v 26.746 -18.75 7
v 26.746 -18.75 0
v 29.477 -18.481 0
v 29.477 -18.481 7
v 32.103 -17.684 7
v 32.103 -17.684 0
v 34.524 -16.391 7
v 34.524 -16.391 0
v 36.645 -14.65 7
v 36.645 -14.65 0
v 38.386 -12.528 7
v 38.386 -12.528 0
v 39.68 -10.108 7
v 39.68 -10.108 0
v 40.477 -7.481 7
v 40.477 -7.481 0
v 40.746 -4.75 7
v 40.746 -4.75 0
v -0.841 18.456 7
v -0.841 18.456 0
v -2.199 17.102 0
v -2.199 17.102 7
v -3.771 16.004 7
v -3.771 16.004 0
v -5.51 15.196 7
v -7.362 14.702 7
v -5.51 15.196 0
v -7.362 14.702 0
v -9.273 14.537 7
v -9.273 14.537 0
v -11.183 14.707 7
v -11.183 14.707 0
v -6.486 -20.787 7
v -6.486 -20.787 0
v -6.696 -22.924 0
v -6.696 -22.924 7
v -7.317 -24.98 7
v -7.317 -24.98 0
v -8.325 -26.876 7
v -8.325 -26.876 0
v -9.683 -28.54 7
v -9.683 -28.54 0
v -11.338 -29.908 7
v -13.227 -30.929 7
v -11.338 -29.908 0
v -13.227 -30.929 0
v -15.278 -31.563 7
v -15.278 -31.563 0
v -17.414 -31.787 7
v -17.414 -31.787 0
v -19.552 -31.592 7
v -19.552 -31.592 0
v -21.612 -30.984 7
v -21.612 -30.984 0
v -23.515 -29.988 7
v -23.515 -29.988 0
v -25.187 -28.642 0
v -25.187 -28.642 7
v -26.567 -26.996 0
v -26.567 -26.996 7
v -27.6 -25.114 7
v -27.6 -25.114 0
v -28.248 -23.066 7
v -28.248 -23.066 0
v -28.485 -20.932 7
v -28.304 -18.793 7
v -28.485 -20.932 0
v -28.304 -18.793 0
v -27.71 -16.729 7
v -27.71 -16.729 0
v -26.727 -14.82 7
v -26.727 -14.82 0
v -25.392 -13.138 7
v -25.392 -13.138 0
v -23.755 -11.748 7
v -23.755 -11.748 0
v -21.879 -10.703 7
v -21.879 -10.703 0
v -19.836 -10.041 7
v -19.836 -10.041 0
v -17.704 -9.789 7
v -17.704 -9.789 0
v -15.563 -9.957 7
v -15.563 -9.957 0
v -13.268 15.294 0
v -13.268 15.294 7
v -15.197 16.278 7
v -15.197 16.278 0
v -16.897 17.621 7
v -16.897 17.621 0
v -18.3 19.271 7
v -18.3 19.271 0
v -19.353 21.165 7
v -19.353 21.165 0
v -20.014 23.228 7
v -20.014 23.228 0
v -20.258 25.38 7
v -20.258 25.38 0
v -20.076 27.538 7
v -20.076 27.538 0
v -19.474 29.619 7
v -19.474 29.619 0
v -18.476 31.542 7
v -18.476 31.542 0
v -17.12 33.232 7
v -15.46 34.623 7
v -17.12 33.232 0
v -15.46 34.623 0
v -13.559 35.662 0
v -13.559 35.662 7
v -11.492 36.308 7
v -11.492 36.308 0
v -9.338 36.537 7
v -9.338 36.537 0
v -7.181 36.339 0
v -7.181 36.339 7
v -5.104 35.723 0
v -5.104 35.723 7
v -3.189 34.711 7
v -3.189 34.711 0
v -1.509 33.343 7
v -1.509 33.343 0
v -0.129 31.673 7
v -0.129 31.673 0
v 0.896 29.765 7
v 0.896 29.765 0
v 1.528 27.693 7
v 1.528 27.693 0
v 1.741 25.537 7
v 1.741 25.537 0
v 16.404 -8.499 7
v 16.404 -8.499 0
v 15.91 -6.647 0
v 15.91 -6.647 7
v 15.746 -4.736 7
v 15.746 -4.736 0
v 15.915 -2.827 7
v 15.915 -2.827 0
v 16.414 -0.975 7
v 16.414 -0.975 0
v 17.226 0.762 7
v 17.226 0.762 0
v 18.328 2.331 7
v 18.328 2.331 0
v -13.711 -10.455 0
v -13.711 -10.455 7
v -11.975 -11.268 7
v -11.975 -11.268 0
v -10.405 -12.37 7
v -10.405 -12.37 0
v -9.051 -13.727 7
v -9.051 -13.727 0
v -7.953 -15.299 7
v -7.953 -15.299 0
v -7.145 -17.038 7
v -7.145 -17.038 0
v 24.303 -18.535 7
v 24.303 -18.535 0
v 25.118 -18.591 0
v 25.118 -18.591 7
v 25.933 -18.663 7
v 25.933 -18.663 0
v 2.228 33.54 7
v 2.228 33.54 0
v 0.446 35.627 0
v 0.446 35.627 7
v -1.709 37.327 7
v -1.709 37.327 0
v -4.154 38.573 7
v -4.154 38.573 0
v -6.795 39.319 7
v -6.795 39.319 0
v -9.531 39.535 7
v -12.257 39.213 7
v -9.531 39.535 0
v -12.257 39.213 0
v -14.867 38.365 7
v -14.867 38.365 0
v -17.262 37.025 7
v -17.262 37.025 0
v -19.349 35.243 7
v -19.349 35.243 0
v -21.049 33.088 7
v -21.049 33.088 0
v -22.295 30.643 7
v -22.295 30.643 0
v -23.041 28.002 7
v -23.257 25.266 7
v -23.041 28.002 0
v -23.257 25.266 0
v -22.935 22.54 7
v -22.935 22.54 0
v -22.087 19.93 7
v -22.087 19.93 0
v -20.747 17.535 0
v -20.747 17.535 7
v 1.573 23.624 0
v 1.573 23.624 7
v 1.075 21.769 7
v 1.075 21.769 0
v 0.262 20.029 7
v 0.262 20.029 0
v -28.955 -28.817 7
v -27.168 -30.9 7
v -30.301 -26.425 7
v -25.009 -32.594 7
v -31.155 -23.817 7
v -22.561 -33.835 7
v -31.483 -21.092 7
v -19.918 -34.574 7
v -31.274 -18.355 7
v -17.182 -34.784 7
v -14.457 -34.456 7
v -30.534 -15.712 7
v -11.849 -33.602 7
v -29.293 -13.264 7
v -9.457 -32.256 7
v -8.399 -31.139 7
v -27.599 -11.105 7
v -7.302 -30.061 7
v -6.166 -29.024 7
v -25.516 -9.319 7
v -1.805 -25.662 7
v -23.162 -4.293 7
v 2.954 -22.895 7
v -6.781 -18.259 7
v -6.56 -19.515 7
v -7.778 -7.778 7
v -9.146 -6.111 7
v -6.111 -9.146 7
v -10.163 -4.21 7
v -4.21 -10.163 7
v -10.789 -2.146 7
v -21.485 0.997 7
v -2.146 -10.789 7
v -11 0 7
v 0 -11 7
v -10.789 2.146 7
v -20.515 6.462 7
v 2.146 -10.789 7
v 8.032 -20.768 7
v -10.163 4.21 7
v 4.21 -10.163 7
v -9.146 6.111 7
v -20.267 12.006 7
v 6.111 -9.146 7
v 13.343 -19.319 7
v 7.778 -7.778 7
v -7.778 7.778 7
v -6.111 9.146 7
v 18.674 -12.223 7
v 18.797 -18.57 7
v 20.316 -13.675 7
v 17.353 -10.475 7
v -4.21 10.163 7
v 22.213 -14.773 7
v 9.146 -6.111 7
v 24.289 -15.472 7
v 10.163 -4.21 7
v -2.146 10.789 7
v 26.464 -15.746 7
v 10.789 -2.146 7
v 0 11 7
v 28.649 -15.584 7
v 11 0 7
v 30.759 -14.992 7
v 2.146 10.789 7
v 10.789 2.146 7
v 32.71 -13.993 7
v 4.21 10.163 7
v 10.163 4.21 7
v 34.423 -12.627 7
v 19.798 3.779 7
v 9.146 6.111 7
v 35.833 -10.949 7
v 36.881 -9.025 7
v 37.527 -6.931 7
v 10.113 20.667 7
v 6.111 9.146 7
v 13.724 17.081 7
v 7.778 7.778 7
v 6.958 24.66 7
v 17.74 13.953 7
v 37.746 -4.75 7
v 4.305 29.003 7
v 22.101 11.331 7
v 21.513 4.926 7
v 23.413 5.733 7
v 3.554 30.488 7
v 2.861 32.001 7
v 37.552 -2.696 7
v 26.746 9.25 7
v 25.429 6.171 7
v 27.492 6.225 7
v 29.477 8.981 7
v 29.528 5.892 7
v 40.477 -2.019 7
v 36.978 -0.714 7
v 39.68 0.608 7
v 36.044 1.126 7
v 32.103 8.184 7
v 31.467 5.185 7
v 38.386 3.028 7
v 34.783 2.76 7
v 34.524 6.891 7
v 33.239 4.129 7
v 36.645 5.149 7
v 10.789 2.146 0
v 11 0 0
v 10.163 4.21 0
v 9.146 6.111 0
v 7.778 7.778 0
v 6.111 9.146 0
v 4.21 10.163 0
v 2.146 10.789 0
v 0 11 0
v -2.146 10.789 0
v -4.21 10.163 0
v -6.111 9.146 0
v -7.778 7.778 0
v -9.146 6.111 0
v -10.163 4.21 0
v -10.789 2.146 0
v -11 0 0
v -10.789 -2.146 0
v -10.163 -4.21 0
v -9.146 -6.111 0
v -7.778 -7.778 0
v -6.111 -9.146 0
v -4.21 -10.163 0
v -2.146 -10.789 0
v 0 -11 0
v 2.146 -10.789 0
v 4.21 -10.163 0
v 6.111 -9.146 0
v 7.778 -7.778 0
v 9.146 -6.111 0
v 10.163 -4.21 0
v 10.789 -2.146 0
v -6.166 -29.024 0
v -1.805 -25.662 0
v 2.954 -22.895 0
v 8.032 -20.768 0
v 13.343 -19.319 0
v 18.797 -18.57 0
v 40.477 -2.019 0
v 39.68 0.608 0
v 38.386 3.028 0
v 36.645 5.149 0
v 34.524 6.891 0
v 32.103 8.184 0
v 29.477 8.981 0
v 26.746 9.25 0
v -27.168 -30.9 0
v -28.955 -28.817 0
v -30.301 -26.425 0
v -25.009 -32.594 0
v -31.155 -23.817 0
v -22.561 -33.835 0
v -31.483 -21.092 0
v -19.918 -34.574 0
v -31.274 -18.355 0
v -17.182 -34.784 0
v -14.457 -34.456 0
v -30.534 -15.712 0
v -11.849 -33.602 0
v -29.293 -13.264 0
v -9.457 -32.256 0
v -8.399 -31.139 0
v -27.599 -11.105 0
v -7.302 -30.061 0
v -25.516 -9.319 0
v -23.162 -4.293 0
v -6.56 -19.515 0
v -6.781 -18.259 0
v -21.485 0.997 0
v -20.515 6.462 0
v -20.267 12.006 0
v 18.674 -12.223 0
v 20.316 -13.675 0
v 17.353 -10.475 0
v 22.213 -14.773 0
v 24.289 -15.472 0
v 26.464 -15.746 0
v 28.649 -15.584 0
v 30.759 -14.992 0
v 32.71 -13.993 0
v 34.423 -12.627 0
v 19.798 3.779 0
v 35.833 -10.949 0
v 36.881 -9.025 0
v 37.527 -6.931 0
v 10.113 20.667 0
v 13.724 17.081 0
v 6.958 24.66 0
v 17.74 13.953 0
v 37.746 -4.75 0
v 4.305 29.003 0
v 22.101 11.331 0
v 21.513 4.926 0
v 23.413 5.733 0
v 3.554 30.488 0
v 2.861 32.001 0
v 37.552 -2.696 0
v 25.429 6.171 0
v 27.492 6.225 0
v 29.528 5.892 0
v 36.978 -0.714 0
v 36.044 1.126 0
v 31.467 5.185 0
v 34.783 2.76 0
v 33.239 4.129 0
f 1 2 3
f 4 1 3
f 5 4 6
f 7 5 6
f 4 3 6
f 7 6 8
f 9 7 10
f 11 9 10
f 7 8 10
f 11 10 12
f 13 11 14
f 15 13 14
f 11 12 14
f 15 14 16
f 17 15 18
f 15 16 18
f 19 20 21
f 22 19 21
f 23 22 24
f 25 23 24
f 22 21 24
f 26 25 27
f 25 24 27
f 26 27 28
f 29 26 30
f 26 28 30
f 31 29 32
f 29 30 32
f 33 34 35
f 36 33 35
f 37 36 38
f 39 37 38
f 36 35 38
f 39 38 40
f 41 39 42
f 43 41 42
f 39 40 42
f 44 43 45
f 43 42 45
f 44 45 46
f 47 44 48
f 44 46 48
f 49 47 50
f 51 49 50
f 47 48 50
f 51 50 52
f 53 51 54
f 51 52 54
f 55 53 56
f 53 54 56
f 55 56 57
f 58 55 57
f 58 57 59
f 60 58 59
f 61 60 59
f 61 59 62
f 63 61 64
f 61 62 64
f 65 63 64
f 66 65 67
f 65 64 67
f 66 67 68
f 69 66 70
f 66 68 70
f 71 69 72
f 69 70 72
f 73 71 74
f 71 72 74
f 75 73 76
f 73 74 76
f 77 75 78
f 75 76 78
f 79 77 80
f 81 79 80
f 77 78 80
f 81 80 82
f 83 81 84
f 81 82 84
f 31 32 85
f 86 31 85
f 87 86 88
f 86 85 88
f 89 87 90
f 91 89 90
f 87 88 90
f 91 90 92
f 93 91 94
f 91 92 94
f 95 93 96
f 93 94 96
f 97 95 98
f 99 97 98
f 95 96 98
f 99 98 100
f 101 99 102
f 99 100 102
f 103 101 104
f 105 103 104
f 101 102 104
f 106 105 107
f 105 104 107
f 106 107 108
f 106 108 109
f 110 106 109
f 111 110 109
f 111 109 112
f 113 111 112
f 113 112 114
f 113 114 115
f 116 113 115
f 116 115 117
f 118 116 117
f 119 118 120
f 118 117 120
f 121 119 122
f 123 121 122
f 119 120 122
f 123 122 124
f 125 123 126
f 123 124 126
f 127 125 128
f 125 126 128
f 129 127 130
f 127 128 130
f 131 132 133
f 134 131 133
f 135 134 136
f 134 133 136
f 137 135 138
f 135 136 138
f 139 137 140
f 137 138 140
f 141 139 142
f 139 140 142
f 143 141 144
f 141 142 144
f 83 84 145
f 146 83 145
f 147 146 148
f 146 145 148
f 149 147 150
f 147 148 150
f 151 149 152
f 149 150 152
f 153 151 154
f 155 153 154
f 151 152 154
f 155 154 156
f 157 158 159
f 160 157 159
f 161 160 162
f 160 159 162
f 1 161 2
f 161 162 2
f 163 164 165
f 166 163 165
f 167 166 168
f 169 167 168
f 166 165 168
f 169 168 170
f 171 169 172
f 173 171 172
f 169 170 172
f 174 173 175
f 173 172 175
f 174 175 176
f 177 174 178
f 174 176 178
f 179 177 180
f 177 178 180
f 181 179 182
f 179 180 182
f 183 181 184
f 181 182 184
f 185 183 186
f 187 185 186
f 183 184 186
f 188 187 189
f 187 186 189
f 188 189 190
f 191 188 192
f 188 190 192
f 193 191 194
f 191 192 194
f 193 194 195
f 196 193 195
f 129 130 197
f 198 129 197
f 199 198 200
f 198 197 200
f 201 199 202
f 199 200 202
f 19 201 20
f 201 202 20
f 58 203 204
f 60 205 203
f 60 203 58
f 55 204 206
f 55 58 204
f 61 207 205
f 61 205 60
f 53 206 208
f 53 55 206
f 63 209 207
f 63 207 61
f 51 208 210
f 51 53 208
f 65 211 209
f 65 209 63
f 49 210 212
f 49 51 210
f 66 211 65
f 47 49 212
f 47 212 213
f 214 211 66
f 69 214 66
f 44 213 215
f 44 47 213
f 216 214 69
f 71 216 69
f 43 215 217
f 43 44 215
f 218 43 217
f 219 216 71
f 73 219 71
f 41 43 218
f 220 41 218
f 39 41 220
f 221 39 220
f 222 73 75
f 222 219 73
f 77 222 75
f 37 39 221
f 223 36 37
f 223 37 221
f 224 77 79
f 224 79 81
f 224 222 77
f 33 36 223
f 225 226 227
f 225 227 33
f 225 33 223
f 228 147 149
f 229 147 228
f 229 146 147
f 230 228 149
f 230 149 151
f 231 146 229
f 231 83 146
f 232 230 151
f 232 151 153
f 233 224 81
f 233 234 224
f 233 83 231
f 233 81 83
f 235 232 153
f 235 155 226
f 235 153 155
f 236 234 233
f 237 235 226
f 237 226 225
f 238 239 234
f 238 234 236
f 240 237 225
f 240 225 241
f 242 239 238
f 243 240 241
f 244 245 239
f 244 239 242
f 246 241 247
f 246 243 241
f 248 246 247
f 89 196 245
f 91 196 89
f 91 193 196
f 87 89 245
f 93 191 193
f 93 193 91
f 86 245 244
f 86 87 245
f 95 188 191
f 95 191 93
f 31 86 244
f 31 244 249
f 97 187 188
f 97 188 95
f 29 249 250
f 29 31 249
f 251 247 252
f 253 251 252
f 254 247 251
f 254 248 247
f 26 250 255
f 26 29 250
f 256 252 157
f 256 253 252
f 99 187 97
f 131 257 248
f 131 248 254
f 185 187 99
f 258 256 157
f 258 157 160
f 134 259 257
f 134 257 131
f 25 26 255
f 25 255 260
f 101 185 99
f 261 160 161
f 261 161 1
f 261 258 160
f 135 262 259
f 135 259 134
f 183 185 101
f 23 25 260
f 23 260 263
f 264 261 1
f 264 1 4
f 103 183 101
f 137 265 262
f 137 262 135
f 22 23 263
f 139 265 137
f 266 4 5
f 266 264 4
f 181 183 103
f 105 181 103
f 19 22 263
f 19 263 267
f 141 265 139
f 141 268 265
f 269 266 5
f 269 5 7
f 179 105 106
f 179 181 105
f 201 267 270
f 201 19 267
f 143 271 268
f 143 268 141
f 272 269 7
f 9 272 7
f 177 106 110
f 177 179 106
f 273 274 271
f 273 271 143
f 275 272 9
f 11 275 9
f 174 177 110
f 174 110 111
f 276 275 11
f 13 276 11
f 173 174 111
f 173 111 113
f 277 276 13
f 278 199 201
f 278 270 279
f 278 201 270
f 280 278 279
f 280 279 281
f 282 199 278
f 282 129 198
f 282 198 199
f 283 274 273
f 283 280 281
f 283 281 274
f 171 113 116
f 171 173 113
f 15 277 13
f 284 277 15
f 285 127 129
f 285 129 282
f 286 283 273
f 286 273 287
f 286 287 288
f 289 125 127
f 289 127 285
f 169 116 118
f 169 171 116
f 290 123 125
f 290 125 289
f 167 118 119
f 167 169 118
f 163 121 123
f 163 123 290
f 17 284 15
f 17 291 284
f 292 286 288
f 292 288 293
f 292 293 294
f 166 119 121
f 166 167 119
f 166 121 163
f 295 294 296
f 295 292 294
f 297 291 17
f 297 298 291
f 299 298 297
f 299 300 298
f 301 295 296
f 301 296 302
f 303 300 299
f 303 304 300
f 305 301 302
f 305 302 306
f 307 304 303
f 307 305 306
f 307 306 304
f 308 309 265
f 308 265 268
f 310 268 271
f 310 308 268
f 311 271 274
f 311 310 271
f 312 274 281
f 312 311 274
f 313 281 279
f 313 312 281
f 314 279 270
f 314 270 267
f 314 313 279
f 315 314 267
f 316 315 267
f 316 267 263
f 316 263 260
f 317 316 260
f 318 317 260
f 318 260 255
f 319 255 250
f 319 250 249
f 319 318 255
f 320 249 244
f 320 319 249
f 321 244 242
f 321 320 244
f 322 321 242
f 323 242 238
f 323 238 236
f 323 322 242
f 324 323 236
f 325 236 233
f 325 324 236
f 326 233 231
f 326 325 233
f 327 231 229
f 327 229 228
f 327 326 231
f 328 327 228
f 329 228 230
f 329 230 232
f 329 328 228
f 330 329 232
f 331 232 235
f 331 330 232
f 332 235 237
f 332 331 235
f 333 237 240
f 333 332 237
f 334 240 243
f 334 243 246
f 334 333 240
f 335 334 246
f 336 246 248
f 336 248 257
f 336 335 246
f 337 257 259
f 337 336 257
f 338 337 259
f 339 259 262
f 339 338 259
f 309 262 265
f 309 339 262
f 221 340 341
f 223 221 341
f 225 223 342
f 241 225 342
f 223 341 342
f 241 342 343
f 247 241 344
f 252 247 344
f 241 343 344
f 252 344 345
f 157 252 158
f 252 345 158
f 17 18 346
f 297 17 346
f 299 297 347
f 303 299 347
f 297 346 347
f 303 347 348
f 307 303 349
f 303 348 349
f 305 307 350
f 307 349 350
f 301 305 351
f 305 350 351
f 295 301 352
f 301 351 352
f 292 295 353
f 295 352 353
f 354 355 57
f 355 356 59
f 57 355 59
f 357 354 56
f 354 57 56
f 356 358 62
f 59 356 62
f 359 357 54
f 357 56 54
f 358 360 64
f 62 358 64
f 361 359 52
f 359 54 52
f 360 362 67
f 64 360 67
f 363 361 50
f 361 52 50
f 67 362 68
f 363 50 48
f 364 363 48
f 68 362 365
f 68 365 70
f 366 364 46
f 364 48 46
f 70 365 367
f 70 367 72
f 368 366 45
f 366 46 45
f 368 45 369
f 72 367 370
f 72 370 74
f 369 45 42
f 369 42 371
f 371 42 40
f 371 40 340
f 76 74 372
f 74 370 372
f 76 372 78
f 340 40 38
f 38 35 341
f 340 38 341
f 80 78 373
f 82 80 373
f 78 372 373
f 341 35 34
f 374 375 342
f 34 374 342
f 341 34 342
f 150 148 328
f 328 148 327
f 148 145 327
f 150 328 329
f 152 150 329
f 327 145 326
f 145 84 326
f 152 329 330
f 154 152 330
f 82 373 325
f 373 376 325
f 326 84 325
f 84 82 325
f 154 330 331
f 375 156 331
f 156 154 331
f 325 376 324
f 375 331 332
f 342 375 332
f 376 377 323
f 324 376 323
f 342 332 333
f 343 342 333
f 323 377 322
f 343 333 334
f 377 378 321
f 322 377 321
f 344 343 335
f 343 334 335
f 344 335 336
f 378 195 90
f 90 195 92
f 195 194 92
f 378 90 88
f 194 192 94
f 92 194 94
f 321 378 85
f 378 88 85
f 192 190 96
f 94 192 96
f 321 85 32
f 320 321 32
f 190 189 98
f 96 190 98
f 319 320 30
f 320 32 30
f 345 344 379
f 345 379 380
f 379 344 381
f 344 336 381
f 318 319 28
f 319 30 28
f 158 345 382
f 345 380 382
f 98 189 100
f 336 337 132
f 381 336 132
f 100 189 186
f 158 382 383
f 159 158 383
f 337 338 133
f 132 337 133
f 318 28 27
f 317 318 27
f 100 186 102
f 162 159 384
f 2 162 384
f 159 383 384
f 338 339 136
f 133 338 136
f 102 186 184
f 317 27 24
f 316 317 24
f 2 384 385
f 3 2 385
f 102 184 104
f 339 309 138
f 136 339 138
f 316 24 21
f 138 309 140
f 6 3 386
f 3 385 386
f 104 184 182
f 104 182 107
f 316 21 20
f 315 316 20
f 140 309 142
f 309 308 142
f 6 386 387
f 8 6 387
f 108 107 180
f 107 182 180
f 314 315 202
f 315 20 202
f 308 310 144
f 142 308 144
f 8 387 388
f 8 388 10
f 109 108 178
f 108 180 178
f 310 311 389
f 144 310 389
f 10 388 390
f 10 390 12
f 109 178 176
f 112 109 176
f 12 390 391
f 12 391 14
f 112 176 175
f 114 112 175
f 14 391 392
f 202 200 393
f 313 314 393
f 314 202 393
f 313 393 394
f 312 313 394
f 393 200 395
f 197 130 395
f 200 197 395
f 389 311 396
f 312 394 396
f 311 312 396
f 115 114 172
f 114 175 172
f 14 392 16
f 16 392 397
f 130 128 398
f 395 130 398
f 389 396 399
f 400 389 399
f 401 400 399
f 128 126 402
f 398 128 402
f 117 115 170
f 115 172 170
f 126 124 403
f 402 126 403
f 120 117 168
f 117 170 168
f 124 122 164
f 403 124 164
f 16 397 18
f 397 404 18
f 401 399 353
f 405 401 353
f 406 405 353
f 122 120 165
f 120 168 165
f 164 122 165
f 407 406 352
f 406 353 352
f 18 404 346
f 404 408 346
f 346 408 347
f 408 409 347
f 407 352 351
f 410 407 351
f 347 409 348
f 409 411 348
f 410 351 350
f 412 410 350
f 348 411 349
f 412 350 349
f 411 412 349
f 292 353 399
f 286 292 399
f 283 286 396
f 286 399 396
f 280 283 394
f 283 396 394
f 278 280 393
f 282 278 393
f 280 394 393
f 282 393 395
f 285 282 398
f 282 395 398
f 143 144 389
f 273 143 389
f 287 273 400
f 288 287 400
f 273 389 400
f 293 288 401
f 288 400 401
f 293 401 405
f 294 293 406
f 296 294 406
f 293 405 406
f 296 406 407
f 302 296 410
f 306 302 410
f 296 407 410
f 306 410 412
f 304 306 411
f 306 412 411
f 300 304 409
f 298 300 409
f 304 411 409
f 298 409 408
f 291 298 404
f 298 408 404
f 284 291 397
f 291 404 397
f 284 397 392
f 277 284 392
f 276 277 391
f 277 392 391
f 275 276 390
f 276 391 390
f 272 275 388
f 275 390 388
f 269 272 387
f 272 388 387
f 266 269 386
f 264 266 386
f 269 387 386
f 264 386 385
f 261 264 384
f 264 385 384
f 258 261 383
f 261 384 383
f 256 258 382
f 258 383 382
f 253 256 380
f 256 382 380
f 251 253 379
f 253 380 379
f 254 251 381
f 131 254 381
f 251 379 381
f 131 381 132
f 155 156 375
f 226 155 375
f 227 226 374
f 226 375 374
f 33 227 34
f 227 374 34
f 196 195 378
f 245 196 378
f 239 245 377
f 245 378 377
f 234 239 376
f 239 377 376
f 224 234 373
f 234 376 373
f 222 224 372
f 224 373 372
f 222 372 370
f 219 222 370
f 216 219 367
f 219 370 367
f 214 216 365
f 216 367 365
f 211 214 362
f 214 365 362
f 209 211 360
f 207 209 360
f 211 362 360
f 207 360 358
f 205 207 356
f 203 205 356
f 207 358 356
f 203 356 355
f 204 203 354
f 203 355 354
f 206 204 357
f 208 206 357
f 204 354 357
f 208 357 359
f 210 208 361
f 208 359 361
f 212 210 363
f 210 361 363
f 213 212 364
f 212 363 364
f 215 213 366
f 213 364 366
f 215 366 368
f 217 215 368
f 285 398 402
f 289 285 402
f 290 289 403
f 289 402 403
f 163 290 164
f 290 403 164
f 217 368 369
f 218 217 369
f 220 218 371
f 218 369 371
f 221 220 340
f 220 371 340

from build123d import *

# Parameters (mm, degrees)
F0_R     = 11
F1_DEPTH = 7


with BuildPart() as f1:
    # F0 (on Top) → F1 (new body)
    with BuildSketch(Plane.XY):
        with BuildLine():
            ThreePointArc((-25.5157140459, -9.3186724491), (-20.5076802891, -7.1172371315), (-15.0383400996, -7.0030554454))
            Line((-15.0383400996, -7.0030554454), (-11.7072511448, 11.7530731792))
            ThreePointArc((-11.7072511448, 11.7530731792), (-16.8027987362, 13.743579223), (-20.7465280977, 17.5348479143))
            ThreePointArc((-20.7465280977, 17.5348479143), (-20.9101748534, 3.7136476237), (-25.5157140459, -9.3186724491))
        make_face()
        with BuildLine():
            Line((-7.1451766465, -17.0378932968), (-4.3248343733, -16.0153134895))
            ThreePointArc((-4.3248343733, -16.0153134895), (-8.474173604, -10.0738468637), (-15.0383400996, -7.0030554454))
            Line((-15.0383400996, -7.0030554454), (-15.5629311457, -9.956833405))
            ThreePointArc((-15.5629311457, -9.956833405), (-10.4053717563, -12.3695980908), (-7.1451766465, -17.0378932968))
        make_face()
        with BuildLine():
            ThreePointArc((-3.4864316481, -20.78735259), (-3.6976252848, -18.364788024), (-4.3248343733, -16.0153134895))
            Line((-4.3248343733, -16.0153134895), (-7.1451766465, -17.0378932968))
            ThreePointArc((-7.1451766465, -17.0378932968), (-6.6523695055, -18.8839090024), (-6.4864316481, -20.78735259))
            ThreePointArc((-6.4864316481, -20.78735259), (-25.9172828959, -27.8528141629), (-15.5629311457, -9.956833405))
            Line((-15.5629311457, -9.956833405), (-15.0383400996, -7.0030554454))
            ThreePointArc((-15.0383400996, -7.0030554454), (-20.5076802891, -7.1172371315), (-25.5157140459, -9.3186724491))
            ThreePointArc((-25.5157140459, -9.3186724491), (-28.9551117891, -28.8166349879), (-9.4571492503, -32.256032731))
            ThreePointArc((-9.4571492503, -32.256032731), (-7.8553926266, -30.5950118305), (-6.1655412039, -29.0237012683))
            ThreePointArc((-6.1655412039, -29.0237012683), (-4.1730461617, -25.1179145502), (-3.4864316481, -20.78735259))
        make_face()
        with BuildLine():
            ThreePointArc((24.3025684766, -18.5352141326), (17.7353030809, -15.4651802248), (13.5839939697, -9.5220568343))
            Line((13.5839939697, -9.5220568343), (-4.3248343733, -16.0153134895))
            ThreePointArc((-4.3248343733, -16.0153134895), (-3.6976252848, -18.364788024), (-3.4864316481, -20.78735259))
            ThreePointArc((-3.4864316481, -20.78735259), (-4.1730461617, -25.1179145502), (-6.1655412039, -29.0237012683))
            ThreePointArc((-6.1655412039, -29.0237012683), (8.0319642762, -20.7683752456), (24.3025684766, -18.5352141326))
        make_face()
        with BuildLine():
            Line((-4.3248343733, -16.0153134895), (13.5839939697, -9.5220568343))
            ThreePointArc((13.5839939697, -9.5220568343), (12.9612940998, -2.3019261853), (16.0320855181, 4.2622403103))
            Line((16.0320855181, 4.2622403103), (1.4543461299, 16.5251122797))
            ThreePointArc((1.4543461299, 16.5251122797), (-4.4871204958, 12.375773049), (-11.7072511448, 11.7530731792))
            Line((-11.7072511448, 11.7530731792), (-15.0383400996, -7.0030554454))
            ThreePointArc((-15.0383400996, -7.0030554454), (-8.474173604, -10.0738468637), (-4.3248343733, -16.0153134895))
        make_face()
        Circle(F0_R, mode=Mode.SUBTRACT)
        with BuildLine():
            ThreePointArc((-11.7072511448, 11.7530731792), (-4.4871204958, 12.375773049), (1.4543461299, 16.5251122797))
            Line((1.4543461299, 16.5251122797), (-0.8414050971, 18.456310432))
            ThreePointArc((-0.8414050971, 18.456310432), (-5.5097003031, 15.1961153222), (-11.1826600987, 14.7068511388))
            Line((-11.1826600987, 14.7068511388), (-11.7072511448, 11.7530731792))
        make_face()
        with BuildLine():
            Line((-0.8414050971, 18.456310432), (1.4543461299, 16.5251122797))
            ThreePointArc((1.4543461299, 16.5251122797), (3.8935792851, 20.7409695987), (4.7408404036, 25.5373703238))
            ThreePointArc((4.7408404036, 25.5373703238), (4.6314684694, 27.2839246284), (4.3050615552, 29.003189787))
            ThreePointArc((4.3050615552, 29.003189787), (3.1997634843, 31.2409281113), (2.228208905, 33.5398927333))
            ThreePointArc((2.228208905, 33.5398927333), (-17.2616820059, 37.0247388251), (-20.7465280977, 17.5348479143))
            ThreePointArc((-20.7465280977, 17.5348479143), (-16.8027987362, 13.743579223), (-11.7072511448, 11.7530731792))
            Line((-11.7072511448, 11.7530731792), (-11.1826600987, 14.7068511388))
            ThreePointArc((-11.1826600987, 14.7068511388), (-16.3246211692, 33.9682215716), (1.7408404036, 25.5373703238))
            ThreePointArc((1.7408404036, 25.5373703238), (1.0751352391, 21.7687697541), (-0.8414050971, 18.456310432))
        make_face()
        with BuildLine():
            Line((1.4543461299, 16.5251122797), (16.0320855181, 4.2622403103))
            ThreePointArc((16.0320855181, 4.2622403103), (20.8367678682, 7.9419405985), (26.7455912444, 9.2499822662))
            ThreePointArc((26.7455912444, 9.2499822662), (13.7242771945, 17.0805133511), (4.3050615552, 29.003189787))
            ThreePointArc((4.3050615552, 29.003189787), (4.6314684694, 27.2839246284), (4.7408404036, 25.5373703238))
            ThreePointArc((4.7408404036, 25.5373703238), (3.8935792851, 20.7409695987), (1.4543461299, 16.5251122797))
        make_face()
        with BuildLine():
            Line((13.5839939697, -9.5220568343), (16.4043362428, -8.499477027))
            ThreePointArc((16.4043362428, -8.499477027), (15.9150720594, -2.8265172314), (18.3278367452, 2.331042158))
            Line((18.3278367452, 2.331042158), (16.0320855181, 4.2622403103))
            ThreePointArc((16.0320855181, 4.2622403103), (12.9612940998, -2.3019261853), (13.5839939697, -9.5220568343))
        make_face()
        with BuildLine():
            ThreePointArc((37.7455912444, -4.7500177338), (28.649034832, -15.5840798763), (16.4043362428, -8.499477027))
            Line((16.4043362428, -8.499477027), (13.5839939697, -9.5220568343))
            ThreePointArc((13.5839939697, -9.5220568343), (17.7353030809, -15.4651802248), (24.3025684766, -18.5352141326))
            ThreePointArc((24.3025684766, -18.5352141326), (25.525635115, -18.624927579), (26.7455912444, -18.7500177338))
            ThreePointArc((26.7455912444, -18.7500177338), (36.645086181, -14.6495126704), (40.7455912444, -4.7500177338))
            ThreePointArc((40.7455912444, -4.7500177338), (36.645086181, 5.1494772028), (26.7455912444, 9.2499822662))
            ThreePointArc((26.7455912444, 9.2499822662), (20.8367678682, 7.9419405985), (16.0320855181, 4.2622403103))
            Line((16.0320855181, 4.2622403103), (18.3278367452, 2.331042158))
            ThreePointArc((18.3278367452, 2.331042158), (30.5141918142, 5.5842771017), (37.7455912444, -4.7500177338))
        make_face()
    extrude(amount=F1_DEPTH)


solid = f1.part
